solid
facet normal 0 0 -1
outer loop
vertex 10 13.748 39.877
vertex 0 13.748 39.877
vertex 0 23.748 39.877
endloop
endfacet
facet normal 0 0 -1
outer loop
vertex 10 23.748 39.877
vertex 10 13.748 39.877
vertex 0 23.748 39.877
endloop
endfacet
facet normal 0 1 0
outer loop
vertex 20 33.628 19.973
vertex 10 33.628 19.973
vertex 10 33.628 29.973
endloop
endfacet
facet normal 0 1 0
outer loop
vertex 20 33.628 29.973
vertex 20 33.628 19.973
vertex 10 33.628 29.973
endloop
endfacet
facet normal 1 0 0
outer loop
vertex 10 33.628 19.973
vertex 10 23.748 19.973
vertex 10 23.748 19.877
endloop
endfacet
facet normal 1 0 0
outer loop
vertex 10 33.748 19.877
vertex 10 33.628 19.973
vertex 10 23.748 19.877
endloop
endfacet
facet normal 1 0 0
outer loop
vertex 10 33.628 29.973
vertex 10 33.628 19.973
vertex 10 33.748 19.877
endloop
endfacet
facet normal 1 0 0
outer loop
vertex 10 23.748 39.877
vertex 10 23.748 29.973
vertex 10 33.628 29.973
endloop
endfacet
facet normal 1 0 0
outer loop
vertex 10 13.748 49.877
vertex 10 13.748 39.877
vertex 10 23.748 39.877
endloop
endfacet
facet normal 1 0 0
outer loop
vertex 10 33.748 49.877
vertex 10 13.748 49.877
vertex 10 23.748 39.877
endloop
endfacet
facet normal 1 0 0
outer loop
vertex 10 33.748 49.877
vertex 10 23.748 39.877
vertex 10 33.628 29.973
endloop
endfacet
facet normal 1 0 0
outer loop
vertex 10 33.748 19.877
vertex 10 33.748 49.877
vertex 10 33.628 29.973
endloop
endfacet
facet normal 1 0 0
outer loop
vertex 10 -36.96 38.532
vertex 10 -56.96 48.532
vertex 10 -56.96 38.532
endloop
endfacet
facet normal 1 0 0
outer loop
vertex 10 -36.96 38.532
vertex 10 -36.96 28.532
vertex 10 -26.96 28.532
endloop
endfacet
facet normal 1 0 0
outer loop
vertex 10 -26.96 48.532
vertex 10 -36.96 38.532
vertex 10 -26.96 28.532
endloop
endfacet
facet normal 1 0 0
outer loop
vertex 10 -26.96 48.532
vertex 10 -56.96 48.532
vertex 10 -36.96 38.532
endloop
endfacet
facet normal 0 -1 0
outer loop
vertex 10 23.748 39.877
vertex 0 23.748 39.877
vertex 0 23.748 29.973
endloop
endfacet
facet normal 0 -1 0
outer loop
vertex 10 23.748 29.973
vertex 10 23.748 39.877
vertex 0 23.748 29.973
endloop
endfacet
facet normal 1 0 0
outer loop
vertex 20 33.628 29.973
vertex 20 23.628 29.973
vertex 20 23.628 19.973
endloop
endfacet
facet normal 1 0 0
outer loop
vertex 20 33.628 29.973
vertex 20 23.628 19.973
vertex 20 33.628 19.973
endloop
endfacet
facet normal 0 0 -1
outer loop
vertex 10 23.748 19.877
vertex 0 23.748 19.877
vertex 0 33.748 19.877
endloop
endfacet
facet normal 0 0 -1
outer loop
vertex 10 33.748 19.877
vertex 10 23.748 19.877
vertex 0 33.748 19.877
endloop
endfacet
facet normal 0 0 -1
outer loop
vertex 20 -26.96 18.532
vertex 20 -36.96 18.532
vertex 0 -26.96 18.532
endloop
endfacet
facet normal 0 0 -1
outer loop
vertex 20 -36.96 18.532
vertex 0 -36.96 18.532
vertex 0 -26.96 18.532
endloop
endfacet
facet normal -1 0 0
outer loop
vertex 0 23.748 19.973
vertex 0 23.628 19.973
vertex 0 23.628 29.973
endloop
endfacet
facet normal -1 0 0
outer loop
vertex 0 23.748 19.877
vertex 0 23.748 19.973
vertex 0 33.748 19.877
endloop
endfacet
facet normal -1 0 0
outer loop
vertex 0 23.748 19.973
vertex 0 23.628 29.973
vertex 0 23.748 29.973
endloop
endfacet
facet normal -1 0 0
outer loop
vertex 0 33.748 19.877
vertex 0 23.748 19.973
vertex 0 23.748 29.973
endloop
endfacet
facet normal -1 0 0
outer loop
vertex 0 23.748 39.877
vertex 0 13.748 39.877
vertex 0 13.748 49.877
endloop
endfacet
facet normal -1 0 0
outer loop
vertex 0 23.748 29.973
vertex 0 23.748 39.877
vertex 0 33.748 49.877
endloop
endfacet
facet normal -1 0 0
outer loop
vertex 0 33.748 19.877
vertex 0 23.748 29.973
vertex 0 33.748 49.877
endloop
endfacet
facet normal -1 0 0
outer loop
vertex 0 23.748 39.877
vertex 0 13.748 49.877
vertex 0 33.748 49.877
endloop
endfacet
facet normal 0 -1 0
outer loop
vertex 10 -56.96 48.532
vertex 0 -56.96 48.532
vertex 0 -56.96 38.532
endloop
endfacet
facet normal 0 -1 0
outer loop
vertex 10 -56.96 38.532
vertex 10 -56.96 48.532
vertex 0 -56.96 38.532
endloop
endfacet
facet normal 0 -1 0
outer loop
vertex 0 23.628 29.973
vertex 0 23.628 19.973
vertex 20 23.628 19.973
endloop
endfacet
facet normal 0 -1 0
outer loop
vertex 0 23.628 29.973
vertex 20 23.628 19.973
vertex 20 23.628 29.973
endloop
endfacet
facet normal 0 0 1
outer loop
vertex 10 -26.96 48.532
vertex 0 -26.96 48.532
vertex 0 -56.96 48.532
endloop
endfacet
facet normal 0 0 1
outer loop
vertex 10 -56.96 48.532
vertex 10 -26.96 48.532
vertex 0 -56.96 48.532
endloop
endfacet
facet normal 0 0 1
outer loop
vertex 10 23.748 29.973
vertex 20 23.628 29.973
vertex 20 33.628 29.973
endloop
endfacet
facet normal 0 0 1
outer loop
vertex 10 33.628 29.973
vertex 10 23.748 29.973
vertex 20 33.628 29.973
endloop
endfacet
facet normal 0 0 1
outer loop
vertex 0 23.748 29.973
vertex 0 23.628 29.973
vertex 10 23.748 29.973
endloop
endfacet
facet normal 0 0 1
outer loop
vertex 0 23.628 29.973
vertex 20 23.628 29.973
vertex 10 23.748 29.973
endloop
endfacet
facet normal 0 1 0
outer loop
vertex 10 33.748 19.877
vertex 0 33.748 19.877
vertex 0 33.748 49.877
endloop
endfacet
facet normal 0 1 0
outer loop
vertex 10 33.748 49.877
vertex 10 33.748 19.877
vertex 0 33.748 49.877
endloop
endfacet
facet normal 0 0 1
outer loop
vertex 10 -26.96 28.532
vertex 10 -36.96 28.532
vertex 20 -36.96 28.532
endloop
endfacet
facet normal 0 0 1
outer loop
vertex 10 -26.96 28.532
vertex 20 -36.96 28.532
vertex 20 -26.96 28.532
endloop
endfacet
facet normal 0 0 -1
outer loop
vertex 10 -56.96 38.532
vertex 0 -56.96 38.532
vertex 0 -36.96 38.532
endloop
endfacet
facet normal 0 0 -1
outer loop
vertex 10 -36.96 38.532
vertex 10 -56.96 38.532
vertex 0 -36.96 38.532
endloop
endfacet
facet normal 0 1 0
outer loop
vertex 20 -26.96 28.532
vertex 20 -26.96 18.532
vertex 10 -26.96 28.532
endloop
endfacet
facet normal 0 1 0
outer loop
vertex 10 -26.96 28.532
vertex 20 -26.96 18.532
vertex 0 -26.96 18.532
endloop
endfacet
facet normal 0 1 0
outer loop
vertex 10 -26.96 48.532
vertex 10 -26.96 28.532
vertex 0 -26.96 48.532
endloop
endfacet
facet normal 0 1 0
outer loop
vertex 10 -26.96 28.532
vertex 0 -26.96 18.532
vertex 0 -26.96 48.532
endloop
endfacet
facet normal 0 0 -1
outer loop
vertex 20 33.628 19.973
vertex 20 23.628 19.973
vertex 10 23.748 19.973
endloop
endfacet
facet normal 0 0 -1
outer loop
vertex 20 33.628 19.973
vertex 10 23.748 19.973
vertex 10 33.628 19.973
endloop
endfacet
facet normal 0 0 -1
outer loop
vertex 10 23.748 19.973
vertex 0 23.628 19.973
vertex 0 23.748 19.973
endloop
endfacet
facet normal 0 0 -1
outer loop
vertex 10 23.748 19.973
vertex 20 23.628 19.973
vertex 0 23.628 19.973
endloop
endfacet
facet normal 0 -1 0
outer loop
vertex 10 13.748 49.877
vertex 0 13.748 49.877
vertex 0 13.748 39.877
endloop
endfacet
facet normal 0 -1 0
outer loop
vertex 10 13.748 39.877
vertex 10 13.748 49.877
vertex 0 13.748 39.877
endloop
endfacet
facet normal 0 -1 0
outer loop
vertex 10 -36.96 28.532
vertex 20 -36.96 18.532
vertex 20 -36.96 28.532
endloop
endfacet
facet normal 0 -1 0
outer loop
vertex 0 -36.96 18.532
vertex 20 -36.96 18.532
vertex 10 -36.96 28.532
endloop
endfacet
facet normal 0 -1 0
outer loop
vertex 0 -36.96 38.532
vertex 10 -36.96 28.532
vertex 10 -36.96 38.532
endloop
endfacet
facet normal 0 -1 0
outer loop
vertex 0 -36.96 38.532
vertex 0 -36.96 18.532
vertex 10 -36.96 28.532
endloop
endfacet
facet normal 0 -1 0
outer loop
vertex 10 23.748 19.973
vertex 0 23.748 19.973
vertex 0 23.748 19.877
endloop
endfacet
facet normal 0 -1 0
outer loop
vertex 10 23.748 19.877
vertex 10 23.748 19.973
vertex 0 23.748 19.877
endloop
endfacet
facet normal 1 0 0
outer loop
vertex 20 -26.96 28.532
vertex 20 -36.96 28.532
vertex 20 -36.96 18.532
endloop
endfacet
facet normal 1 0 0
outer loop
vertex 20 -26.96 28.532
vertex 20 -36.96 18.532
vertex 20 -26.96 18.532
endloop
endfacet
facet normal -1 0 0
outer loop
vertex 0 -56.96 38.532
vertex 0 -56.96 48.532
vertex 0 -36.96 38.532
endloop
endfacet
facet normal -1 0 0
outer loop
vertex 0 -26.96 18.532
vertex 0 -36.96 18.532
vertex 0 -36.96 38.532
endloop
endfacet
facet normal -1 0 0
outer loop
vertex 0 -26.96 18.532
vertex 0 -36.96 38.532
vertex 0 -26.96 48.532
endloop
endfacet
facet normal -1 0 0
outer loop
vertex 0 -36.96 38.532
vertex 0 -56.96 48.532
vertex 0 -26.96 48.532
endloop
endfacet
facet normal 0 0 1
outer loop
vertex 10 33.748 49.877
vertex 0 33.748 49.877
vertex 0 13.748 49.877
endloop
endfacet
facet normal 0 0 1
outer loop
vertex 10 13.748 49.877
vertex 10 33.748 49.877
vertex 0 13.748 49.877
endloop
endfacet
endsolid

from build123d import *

# Parameters (mm, degrees)
F1_DEPTH = 10
F2_W     = 10
F2_H     = 10
F3_DEPTH = 10
F5_DEPTH = 10
F6_W     = 10
F6_H     = 10
F7_DEPTH = 20


with BuildPart() as f1:
    # F0 (on Right) → F1 (new body)
    with BuildSketch(Plane.YZ):
        Polygon((-26.959953, 48.531529), (-56.959953, 48.531529), (-56.959953, 38.531529), (-36.959953, 38.531529), (-36.959953, 18.531529), (-26.959953, 18.531529), align=None)
    extrude(amount=F1_DEPTH)

    # F2 (on face) → F3 (join)
    with BuildSketch(Plane.YZ.offset(10)):
        with Locations((-31.959953, 23.531529)):
            Rectangle(F2_W, F2_H)
    extrude(amount=F3_DEPTH)


with BuildPart() as f5:
    # F4 (on Right) → F5 (new body)
    with BuildSketch(Plane.YZ):
        Polygon((33.747681, 49.877016), (13.747681, 49.877016), (13.747681, 39.877016), (23.747681, 39.877016), (23.747681, 19.877016), (33.747681, 19.877016), align=None)
    extrude(amount=F5_DEPTH)

    # F6 (on Right) → F7 (join)
    with BuildSketch(Plane.YZ):
        with Locations((28.627831, 24.973129)):
            Rectangle(F6_W, F6_H)
    extrude(amount=F7_DEPTH)


solid = Compound([f1.part, f5.part])
